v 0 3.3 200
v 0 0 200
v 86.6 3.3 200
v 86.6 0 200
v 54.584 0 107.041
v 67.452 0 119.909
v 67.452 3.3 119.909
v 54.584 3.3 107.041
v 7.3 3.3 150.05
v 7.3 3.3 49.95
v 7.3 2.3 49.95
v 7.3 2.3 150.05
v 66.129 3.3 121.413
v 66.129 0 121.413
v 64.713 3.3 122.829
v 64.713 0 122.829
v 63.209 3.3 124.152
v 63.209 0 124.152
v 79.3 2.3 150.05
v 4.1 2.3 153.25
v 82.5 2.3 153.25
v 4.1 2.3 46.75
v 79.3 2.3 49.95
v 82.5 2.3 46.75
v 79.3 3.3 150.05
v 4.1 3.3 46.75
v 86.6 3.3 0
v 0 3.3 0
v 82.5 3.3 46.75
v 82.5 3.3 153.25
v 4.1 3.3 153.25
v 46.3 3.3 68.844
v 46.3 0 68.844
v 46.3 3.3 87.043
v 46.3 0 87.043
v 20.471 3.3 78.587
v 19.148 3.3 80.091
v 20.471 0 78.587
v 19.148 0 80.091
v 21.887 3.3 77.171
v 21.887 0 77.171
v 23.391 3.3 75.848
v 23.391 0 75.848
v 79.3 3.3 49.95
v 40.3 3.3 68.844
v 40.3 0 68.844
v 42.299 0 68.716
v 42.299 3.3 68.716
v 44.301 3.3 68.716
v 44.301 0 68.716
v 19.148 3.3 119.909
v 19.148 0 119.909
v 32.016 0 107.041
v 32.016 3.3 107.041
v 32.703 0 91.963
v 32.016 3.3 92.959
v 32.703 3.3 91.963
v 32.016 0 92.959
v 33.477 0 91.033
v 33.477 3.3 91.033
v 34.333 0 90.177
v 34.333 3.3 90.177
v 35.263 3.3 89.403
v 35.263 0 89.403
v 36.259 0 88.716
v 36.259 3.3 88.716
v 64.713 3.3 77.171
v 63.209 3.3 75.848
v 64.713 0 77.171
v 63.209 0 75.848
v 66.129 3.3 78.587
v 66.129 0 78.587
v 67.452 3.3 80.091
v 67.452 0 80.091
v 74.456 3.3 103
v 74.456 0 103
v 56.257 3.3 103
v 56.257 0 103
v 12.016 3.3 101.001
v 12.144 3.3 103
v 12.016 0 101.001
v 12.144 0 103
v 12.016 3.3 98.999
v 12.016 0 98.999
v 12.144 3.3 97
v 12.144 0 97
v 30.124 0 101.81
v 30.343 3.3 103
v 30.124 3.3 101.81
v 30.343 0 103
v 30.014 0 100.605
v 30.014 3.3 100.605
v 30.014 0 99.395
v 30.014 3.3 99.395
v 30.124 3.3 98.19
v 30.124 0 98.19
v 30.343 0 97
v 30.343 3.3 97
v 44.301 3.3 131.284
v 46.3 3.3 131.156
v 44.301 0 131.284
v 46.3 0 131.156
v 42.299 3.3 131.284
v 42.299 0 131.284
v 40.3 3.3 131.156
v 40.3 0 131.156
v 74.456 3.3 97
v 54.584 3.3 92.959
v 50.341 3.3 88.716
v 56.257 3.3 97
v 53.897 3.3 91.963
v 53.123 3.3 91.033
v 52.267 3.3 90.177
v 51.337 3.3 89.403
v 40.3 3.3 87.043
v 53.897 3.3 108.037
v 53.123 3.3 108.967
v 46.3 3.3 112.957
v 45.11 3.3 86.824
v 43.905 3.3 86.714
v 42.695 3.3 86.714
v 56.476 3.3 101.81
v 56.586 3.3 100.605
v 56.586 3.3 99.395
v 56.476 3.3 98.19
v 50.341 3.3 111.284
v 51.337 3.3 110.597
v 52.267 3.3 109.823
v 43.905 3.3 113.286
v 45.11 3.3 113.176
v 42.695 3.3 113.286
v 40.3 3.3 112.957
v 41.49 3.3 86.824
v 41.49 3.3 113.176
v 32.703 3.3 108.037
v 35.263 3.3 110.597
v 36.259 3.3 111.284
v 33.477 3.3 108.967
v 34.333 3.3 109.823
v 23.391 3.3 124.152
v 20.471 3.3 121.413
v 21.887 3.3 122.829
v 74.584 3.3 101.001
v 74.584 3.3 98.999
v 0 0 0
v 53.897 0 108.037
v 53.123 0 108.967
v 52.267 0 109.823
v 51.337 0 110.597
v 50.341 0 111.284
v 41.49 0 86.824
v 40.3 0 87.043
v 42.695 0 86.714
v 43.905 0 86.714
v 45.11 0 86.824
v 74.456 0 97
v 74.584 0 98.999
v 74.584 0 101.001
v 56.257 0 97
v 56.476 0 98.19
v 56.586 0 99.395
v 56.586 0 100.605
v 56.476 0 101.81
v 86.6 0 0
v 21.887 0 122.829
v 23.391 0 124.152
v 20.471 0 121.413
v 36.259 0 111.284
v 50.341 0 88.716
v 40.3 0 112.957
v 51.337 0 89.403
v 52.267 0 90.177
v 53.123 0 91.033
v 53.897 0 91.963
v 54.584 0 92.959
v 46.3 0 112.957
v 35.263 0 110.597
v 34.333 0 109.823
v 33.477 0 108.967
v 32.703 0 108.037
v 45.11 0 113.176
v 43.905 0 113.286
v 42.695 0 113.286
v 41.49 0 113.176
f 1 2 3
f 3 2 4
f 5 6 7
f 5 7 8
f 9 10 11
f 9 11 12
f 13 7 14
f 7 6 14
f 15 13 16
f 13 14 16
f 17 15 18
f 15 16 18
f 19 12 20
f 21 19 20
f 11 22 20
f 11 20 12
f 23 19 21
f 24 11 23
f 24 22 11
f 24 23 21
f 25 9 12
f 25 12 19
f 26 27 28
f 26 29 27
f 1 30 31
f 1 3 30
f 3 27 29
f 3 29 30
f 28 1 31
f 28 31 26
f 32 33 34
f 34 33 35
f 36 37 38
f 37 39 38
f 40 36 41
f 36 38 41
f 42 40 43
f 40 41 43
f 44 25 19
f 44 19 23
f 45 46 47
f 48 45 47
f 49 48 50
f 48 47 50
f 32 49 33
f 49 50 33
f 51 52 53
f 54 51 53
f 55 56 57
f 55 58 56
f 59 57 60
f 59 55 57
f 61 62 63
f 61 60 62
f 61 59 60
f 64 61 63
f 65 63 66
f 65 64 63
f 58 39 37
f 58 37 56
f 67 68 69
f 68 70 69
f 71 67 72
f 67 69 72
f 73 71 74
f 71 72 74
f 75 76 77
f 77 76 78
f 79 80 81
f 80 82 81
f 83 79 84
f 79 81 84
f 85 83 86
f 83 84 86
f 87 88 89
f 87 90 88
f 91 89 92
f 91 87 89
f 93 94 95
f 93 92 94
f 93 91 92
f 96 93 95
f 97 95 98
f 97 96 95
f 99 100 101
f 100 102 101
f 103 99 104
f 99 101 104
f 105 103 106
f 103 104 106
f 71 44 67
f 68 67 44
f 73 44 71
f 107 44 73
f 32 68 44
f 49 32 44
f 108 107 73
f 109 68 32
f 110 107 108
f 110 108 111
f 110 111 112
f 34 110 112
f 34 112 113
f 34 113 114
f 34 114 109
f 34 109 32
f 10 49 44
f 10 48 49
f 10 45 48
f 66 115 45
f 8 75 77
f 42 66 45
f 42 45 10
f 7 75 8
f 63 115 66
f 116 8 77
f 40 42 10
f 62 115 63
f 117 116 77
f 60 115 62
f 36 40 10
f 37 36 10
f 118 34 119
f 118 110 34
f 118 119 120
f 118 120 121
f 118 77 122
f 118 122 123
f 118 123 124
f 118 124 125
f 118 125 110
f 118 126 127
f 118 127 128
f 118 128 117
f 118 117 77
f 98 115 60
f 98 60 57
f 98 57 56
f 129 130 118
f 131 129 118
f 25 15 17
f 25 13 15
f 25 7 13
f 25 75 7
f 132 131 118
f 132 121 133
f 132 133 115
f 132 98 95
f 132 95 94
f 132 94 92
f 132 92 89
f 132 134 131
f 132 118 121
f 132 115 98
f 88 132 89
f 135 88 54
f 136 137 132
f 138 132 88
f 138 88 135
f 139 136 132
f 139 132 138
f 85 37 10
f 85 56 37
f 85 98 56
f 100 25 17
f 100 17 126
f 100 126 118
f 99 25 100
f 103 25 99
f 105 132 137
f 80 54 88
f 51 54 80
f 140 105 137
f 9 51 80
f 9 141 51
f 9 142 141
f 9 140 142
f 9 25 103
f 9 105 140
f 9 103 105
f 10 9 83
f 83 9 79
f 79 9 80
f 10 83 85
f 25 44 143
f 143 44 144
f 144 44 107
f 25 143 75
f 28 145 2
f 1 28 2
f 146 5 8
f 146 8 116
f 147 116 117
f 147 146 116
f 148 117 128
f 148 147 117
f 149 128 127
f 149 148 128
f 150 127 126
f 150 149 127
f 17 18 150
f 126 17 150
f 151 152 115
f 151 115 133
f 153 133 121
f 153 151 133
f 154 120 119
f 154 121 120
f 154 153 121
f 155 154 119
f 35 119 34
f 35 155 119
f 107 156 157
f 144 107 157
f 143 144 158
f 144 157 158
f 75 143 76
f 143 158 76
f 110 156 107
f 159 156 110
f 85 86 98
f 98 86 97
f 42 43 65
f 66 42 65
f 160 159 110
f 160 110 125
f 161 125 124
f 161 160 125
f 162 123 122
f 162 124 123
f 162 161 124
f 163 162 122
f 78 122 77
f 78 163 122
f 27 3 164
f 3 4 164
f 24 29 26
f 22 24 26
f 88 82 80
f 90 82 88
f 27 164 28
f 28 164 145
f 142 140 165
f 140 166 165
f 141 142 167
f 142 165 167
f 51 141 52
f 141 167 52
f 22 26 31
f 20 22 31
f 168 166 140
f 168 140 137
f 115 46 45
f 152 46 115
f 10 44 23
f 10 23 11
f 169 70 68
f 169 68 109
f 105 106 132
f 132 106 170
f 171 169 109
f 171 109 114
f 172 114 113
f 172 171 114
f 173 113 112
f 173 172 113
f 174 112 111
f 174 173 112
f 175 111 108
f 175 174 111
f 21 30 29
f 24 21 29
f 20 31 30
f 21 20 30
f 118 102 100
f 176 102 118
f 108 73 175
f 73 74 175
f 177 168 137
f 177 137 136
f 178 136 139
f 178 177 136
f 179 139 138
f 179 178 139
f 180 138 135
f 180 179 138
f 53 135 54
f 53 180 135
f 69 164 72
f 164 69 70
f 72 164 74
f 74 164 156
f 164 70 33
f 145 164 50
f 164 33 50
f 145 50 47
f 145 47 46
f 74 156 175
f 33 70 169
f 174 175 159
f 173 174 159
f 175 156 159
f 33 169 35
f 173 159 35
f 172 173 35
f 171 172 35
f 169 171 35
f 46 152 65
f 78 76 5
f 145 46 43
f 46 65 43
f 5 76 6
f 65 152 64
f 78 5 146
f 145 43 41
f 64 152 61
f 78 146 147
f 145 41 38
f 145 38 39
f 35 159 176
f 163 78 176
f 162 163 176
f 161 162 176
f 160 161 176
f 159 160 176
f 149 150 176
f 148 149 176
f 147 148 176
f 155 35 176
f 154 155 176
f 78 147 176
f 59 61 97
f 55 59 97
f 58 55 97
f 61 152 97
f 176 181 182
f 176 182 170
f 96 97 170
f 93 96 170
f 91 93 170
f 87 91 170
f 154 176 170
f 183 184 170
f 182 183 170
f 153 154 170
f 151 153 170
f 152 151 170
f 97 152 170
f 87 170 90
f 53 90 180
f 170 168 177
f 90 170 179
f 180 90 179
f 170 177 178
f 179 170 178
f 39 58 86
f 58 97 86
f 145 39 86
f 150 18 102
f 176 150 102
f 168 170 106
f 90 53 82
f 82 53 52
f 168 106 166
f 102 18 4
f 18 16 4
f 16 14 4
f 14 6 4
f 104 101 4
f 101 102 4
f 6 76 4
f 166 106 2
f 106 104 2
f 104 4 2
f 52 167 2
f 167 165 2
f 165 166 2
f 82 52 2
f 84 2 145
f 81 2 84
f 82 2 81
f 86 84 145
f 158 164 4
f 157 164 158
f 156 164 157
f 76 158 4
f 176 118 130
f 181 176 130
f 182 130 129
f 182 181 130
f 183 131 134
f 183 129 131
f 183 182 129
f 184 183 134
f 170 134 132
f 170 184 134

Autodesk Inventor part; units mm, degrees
ref_plane "YZ Plane" through (0, 0, 0) normal (1, 0, 0) x (0, 1, 0)
ref_plane "XZ Plane" through (0, 0, 0) normal (0, 1, 0) x (-1, 0, 0)
ref_plane "XY Plane" through (0, 0, 0) normal (0, 0, 1) x (1, 0, 0)
sketch "Sketch7" plane through (0, 0, 0) normal (0, 1, 0) x (-1, 0, 0)
  circle A0 centre (-43.3, 100) radius 13.3 construction
  circle A1 centre (-43.3, 100) radius 31.3 construction
  line L0 (-86.6, 0) -> (0, 0)
  line L1 (0, 0) -> (0, 200)
  line L2 (0, 200) -> (-86.6, 200)
  line L3 (-86.6, 200) -> (-86.6, 0)
  line L4 (0, 200) -> (-86.6, 200)
  line L5 (-46.3, 68.8441) -> (-46.3, 87.0428)
  line L6 (-40.3, 68.8441) -> (-40.3, 87.0428)
  arc A2 (-46.3, 87.0428) -> (-40.3, 87.0428) centre (-43.3, 100) ccw
  arc A3 (-46.3, 68.8441) -> (-40.3, 68.8441) centre (-43.3, 100) ccw
  line L7 (-19.1481, 80.0908) -> (-32.0165, 92.9592)
  arc A4 (-23.3908, 75.8481) -> (-19.1481, 80.0908) centre (-43.3, 100) ccw
  line L8 (-23.3908, 75.8481) -> (-36.2592, 88.7165)
  arc A5 (-36.2592, 88.7165) -> (-32.0165, 92.9592) centre (-43.3, 100) ccw
  line L9 (-12.1441, 103) -> (-30.3428, 103)
  arc A6 (-12.1441, 97) -> (-12.1441, 103) centre (-43.3, 100) ccw
  line L10 (-12.1441, 97) -> (-30.3428, 97)
  arc A7 (-30.3428, 97) -> (-30.3428, 103) centre (-43.3, 100) ccw
  line L11 (-23.3908, 124.1519) -> (-36.2592, 111.2835)
  arc A8 (-19.1481, 119.9092) -> (-23.3908, 124.1519) centre (-43.3, 100) ccw
  line L12 (-19.1481, 119.9092) -> (-32.0165, 107.0408)
  arc A9 (-32.0165, 107.0408) -> (-36.2592, 111.2835) centre (-43.3, 100) ccw
  line L13 (-46.3, 131.1559) -> (-46.3, 112.9572)
  arc A10 (-40.3, 131.1559) -> (-46.3, 131.1559) centre (-43.3, 100) ccw
  line L14 (-40.3, 131.1559) -> (-40.3, 112.9572)
  arc A11 (-40.3, 112.9572) -> (-46.3, 112.9572) centre (-43.3, 100) ccw
  line L15 (-67.4519, 119.9092) -> (-54.5835, 107.0408)
  arc A12 (-63.2092, 124.1519) -> (-67.4519, 119.9092) centre (-43.3, 100) ccw
  line L16 (-63.2092, 124.1519) -> (-50.3408, 111.2835)
  arc A13 (-50.3408, 111.2835) -> (-54.5835, 107.0408) centre (-43.3, 100) ccw
  line L17 (-74.4559, 97) -> (-56.2572, 97)
  arc A14 (-74.4559, 103) -> (-74.4559, 97) centre (-43.3, 100) ccw
  line L18 (-74.4559, 103) -> (-56.2572, 103)
  arc A15 (-56.2572, 103) -> (-56.2572, 97) centre (-43.3, 100) ccw
  line L19 (-63.2092, 75.8481) -> (-50.3408, 88.7165)
  arc A16 (-67.4519, 80.0908) -> (-63.2092, 75.8481) centre (-43.3, 100) ccw
  line L20 (-67.4519, 80.0908) -> (-54.5835, 92.9592)
  arc A17 (-54.5835, 92.9592) -> (-50.3408, 88.7165) centre (-43.3, 100) ccw
  line L21 (-86.6, 200) -> (-86.6, 0)
  point P0 (-43.3, 200)
  point P1 (-86.6, 100)
  point P2 (-43.3, 200)
  point P3 (-43.3, 86.7)
  point P4 (-33.8955, 90.5955)
  point P5 (-30, 100)
  point P6 (-33.8955, 109.4045)
  point P7 (-43.3, 113.3)
  point P8 (-52.7045, 109.4045)
  point P9 (-56.6, 100)
  point P10 (-52.7045, 90.5955)
  dimension "d36" = 18
  dimension "d37" = 6
  dimension "d38" = 360
  dimension "d39" = 30
  dimension "d42" = 100
  dimension "d43" = 200
  dimension "d44" = 86.6
extrude "Extrusion3" add sketch "Sketch7" along normal blind 3.3
sketch "Sketch8" plane through (0, 3.3, 0) normal (0, 1, 0) x (1, 0, 0)
  line L0 (7.3, -150.05) -> (79.3, -150.05)
  line L1 (79.3, -150.05) -> (79.3, -49.95)
  line L2 (79.3, -49.95) -> (7.3, -49.95)
  line L3 (7.3, -49.95) -> (7.3, -150.05)
  line L4 (4.1, -153.25) -> (82.5, -153.25)
  line L5 (82.5, -153.25) -> (82.5, -46.75)
  line L6 (82.5, -46.75) -> (4.1, -46.75)
  line L7 (4.1, -46.75) -> (4.1, -153.25)
  line L8 (86.6, 0) -> (0, 0) projected
  line L9 (0, 0) -> (0, -200) projected
  dimension "d47" = 3.2
  dimension "d48" = 3.2
  dimension "d49" = 3.2
  dimension "d50" = 3.2
  dimension "largo_bateria" = 100.1
  dimension "ancho_bateria" = 72
  dimension "d54" = 7.3
  dimension "d55" = 49.95
extrude "Extrusion4" cut sketch "Sketch8" against normal blind 1
equation "\"d36\" = 1.5 * d41"
equation "\"d37\" = 0.2 * d39"
equation "\"d39\" = d40"
equation "\"d42\" = 0.5 * largo_base"
equation "\"d43\" = largo_base"
equation "\"d48\" = d47"
equation "\"d49\" = d47"
equation "\"d50\" = d47"
equation "\"d55\" = 0.5 * largo_base - 0.5 * largo_bateria"
equation "\"espesor\" = 3.2"
equation "\"d41\" = 12"
equation "\"largo_base\" = 200"
equation "\"d40\" = 30"
properties part number "cuerpo-base-bateria"
